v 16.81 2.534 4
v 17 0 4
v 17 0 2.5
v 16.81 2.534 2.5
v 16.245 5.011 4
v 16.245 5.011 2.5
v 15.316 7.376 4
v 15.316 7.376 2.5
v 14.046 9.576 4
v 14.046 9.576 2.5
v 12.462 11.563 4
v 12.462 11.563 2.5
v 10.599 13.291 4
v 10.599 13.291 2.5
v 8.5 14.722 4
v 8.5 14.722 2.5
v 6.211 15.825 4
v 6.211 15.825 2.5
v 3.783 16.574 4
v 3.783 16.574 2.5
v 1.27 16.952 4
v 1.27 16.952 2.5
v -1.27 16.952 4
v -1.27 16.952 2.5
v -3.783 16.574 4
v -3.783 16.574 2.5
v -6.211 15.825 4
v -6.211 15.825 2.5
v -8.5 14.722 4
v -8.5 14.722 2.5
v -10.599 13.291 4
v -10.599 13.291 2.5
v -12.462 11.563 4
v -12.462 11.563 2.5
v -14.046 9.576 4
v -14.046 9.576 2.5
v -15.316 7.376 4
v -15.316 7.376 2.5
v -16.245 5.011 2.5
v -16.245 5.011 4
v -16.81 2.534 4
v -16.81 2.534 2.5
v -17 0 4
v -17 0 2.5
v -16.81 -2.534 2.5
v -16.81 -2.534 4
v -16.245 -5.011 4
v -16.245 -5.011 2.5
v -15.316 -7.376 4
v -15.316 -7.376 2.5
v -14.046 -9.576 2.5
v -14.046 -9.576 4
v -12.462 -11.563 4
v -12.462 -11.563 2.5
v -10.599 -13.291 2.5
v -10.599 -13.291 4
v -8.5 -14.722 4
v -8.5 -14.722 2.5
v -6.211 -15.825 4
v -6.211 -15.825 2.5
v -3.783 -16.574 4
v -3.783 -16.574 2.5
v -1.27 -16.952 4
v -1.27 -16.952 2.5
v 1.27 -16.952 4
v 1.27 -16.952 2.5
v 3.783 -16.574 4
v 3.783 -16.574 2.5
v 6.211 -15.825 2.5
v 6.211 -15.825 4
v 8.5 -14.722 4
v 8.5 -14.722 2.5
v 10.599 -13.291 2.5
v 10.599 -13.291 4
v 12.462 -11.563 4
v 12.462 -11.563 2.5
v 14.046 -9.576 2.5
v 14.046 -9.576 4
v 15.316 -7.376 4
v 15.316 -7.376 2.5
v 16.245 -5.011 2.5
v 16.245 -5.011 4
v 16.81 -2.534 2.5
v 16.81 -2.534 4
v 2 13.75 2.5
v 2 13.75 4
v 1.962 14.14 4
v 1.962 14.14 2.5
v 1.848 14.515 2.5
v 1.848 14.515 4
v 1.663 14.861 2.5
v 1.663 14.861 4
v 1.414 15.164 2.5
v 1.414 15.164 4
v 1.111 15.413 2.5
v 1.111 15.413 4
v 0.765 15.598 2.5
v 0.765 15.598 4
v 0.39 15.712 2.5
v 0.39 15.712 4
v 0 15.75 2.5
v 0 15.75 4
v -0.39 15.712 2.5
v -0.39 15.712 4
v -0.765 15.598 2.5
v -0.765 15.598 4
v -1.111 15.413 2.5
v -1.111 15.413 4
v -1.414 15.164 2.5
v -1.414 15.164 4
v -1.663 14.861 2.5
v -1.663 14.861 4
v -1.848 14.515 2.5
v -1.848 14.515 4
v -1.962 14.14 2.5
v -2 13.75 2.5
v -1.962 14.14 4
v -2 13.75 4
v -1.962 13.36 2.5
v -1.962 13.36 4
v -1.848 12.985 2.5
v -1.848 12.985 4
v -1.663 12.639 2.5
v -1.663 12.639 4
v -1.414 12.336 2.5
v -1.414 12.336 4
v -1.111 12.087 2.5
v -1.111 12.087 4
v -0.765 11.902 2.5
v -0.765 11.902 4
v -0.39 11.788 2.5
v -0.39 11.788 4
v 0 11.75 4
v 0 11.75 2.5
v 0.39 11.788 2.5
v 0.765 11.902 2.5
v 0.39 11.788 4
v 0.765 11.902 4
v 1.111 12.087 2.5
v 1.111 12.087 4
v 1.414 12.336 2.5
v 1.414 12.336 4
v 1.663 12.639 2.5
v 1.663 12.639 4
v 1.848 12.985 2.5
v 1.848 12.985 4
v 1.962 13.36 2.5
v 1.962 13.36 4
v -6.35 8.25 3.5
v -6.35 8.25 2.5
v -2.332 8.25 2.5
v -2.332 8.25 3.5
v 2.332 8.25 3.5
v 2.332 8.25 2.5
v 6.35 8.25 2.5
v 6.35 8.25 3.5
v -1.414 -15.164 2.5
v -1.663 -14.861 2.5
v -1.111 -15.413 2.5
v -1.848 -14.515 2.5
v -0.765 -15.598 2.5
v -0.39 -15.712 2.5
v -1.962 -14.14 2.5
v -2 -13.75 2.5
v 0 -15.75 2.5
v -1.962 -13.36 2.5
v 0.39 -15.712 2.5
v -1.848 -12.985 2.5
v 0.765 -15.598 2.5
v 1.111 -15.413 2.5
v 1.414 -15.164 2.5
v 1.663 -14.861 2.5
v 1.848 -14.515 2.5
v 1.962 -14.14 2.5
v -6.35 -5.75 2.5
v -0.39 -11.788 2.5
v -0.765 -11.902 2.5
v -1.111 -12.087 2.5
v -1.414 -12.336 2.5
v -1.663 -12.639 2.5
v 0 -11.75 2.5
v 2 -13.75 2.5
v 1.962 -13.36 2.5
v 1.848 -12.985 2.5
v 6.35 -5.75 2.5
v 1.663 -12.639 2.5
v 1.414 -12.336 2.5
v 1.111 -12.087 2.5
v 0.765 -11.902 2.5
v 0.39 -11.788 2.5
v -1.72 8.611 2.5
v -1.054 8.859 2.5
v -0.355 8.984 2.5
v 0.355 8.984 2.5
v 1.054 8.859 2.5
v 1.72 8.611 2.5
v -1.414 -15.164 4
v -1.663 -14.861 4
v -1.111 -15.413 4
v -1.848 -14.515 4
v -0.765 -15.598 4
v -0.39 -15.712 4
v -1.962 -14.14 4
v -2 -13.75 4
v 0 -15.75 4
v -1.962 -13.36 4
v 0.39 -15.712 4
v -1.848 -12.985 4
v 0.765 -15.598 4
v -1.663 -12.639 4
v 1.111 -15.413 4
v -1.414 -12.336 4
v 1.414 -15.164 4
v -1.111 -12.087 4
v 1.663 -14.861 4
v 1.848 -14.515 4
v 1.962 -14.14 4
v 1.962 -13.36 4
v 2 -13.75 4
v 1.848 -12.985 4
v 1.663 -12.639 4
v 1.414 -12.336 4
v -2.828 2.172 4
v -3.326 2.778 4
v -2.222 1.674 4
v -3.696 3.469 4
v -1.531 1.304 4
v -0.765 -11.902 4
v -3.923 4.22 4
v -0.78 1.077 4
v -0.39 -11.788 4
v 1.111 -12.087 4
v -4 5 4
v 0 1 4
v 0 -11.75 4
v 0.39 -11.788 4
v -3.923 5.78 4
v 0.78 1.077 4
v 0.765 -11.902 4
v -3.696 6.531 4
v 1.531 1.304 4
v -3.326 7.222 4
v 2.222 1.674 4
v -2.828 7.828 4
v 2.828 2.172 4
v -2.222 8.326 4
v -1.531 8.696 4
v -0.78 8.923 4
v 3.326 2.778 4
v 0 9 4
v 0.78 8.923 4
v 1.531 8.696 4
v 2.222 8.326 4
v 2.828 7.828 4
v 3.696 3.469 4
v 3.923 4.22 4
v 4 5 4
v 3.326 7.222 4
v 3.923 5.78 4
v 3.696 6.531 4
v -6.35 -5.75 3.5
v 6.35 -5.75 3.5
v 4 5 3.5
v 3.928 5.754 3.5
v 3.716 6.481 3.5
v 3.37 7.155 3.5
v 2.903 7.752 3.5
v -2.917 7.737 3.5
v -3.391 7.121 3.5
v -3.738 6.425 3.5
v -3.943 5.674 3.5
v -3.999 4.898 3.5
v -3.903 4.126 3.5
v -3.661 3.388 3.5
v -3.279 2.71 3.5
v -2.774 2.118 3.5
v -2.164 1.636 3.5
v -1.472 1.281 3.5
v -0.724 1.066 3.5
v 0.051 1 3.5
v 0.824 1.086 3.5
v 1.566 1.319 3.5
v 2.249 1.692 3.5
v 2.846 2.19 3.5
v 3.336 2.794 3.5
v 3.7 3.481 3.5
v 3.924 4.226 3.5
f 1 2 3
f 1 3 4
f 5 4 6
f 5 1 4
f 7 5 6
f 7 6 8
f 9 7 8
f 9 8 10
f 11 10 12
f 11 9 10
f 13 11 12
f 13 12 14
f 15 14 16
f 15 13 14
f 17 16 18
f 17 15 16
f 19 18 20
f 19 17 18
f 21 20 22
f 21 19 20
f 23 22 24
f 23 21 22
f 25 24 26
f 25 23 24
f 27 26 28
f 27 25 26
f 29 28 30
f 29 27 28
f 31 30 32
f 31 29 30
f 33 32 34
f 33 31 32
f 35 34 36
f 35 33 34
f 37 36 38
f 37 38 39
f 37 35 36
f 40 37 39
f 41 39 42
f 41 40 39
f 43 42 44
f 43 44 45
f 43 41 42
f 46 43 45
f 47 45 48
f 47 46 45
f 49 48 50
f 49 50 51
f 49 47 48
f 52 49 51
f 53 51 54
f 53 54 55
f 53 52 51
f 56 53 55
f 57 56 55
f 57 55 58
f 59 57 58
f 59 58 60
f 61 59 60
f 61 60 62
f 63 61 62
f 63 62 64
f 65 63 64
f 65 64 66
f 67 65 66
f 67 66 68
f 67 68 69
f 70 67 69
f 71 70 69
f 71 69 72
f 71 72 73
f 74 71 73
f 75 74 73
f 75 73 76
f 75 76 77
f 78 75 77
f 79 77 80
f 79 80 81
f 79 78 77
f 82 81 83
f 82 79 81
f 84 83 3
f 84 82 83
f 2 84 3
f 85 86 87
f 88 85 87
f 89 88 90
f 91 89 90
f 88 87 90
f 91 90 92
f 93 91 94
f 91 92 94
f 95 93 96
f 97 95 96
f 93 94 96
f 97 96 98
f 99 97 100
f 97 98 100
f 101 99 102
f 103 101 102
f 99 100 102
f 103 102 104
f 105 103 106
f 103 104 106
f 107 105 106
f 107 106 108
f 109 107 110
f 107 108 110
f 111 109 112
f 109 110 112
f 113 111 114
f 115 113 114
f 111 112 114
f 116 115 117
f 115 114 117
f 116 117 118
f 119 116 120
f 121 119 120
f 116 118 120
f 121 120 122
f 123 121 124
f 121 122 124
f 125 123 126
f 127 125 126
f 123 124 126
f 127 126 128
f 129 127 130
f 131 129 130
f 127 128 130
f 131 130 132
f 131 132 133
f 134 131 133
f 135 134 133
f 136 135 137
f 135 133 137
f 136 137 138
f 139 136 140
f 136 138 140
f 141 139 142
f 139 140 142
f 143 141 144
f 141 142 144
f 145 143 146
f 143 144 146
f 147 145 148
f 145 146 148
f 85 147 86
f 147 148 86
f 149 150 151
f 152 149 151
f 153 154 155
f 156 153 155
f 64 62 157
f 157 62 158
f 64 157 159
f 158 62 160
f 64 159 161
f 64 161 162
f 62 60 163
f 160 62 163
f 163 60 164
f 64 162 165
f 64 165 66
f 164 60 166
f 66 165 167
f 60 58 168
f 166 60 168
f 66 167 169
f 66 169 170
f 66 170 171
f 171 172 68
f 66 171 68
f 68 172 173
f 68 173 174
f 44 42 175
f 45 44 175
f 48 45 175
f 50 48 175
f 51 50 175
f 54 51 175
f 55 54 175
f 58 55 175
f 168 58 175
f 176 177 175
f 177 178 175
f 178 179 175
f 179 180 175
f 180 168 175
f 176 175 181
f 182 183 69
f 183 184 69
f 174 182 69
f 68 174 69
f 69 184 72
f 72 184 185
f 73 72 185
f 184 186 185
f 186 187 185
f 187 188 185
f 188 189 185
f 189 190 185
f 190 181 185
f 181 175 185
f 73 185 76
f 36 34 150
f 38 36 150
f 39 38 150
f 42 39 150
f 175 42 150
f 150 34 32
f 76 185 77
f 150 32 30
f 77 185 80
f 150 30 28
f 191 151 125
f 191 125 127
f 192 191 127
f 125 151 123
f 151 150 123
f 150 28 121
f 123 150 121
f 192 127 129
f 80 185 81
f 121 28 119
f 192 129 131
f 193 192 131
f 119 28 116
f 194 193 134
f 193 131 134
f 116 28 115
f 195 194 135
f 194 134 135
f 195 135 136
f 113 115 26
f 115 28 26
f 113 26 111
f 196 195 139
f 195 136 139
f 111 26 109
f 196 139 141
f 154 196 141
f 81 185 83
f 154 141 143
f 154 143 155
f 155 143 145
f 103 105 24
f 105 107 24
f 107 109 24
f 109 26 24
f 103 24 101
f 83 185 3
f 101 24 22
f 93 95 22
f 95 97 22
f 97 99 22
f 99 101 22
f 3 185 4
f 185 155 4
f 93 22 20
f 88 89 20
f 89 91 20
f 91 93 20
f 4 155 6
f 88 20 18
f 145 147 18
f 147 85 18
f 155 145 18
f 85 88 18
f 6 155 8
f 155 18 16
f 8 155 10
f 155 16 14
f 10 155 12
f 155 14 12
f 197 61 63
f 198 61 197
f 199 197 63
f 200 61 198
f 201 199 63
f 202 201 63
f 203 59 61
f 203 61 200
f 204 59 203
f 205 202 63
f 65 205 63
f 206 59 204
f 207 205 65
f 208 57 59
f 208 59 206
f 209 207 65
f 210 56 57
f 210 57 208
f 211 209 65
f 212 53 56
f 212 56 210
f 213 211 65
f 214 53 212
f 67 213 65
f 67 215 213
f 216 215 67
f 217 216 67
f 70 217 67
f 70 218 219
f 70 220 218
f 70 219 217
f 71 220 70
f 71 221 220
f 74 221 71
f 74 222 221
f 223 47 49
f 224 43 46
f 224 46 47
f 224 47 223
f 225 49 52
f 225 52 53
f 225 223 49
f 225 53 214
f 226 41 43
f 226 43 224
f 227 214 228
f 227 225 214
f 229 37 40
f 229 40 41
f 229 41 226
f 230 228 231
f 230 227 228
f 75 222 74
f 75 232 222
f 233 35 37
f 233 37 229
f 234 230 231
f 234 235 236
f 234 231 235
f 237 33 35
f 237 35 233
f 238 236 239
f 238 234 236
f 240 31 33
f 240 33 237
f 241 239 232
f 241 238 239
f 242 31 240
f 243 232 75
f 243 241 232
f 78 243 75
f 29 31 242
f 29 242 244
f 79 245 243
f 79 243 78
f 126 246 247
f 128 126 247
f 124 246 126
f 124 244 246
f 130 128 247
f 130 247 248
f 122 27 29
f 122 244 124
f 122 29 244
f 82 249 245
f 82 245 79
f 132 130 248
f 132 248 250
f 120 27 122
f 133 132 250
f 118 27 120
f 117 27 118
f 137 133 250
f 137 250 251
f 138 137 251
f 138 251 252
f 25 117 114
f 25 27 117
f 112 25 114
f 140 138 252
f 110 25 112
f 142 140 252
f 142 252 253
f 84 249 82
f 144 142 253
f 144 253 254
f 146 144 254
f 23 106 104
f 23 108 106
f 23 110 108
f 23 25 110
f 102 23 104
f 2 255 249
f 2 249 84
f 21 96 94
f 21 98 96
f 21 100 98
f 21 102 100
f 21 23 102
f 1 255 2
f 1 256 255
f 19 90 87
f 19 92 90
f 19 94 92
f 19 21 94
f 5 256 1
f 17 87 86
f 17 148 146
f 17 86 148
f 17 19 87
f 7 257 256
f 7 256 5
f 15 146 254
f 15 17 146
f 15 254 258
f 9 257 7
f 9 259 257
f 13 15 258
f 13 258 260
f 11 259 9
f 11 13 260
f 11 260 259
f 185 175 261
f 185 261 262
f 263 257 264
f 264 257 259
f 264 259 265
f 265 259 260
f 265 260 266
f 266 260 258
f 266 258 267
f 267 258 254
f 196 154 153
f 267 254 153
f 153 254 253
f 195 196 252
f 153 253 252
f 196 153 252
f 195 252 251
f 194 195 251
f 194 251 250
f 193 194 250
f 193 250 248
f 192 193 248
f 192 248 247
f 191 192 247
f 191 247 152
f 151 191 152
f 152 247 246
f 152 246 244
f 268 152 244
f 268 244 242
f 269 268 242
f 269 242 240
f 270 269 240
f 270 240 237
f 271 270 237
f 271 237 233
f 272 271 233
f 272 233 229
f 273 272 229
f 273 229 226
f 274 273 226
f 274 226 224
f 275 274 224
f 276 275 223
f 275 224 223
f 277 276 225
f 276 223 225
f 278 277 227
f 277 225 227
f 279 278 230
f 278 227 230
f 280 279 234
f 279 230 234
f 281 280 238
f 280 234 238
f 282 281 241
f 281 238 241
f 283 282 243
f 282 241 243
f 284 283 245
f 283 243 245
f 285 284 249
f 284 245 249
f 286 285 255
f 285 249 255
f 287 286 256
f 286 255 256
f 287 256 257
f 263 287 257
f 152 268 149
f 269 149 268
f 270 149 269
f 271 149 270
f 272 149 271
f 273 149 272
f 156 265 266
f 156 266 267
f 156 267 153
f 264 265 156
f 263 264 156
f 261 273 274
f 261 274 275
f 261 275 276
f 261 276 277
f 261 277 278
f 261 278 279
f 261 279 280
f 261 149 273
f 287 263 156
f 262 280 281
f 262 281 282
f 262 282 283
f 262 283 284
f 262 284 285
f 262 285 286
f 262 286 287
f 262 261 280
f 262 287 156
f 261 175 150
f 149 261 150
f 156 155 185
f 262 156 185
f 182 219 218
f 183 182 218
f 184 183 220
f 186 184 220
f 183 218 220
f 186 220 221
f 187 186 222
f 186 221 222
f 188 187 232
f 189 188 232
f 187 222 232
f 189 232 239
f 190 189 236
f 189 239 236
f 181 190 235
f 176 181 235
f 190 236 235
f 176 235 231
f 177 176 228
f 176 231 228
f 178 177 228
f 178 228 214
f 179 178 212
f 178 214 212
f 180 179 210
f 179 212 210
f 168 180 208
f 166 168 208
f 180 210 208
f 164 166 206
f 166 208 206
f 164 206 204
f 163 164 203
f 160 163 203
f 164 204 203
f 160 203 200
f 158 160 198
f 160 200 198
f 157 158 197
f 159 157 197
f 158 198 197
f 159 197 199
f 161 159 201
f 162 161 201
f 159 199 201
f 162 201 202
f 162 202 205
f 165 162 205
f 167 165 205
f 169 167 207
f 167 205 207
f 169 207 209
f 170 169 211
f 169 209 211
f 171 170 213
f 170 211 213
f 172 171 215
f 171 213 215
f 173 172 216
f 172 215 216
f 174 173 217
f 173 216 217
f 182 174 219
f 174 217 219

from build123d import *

# Parameters (mm, degrees)
F0_R     = 9.1
F0_W     = 12.7
F0_H     = 11.5
F1_DEPTH = 14
F3_DEPTH = 5
F5_R     = 17
F5_R_2   = 2
F5_R_3   = 4
F6_DEPTH = 1.5
F2_W     = 12.7
F2_H     = 9
F2_H_2   = 2.5
F8_DEPTH = 3.5


with BuildPart() as f1:
    # F0 (on Top) → F1 (new body)
    with BuildSketch(Plane.XY):
        Circle(F0_R)
        Rectangle(F0_W, F0_H, mode=Mode.SUBTRACT)
    extrude(amount=F1_DEPTH)

    # F2 (on face) → F3 (cut)
    with BuildSketch(Plane(origin=(0, 0, 0), x_dir=(1, 0, 0), z_dir=(0, 0, -1))):
        with BuildLine():
            Line((6.35, -6.5182436285), (6.35, -5.75))
            Line((6.35, -5.75), (-6.35, -5.75))
            Line((-6.35, -5.75), (-6.35, -6.5182436285))
            ThreePointArc((-6.35, -6.5182436285), (-5.1681747735, -7.4899912891), (-3.8402473879, -8.25))
            Line((-3.8402473879, -8.25), (3.8402473879, -8.25))
            ThreePointArc((3.8402473879, -8.25), (5.1681747735, -7.4899912891), (6.35, -6.5182436285))
        make_face()
    extrude(amount=-F3_DEPTH, mode=Mode.SUBTRACT)


with BuildPart() as f6:
    # F5 (on offset) → F6 (new body)
    with BuildSketch(Plane.XY.offset(4)):
        Circle(F5_R)
        with Locations((0, -13.75)):
            Circle(F5_R_2, mode=Mode.SUBTRACT)
        with Locations((0, 5)):
            Circle(F5_R_3, mode=Mode.SUBTRACT)
        with Locations((0, 13.75)):
            Circle(F5_R_2, mode=Mode.SUBTRACT)
    extrude(amount=-F6_DEPTH)

    # F2 (on face) → F8 (cut)
    with BuildSketch(Plane(origin=(0, 0, 0), x_dir=(1, 0, 0), z_dir=(0, 0, -1))):
        with Locations((0, 1.25)):
            Rectangle(F2_W, F2_H)
        with Locations((0, -4.5)):
            Rectangle(F2_W, F2_H_2)
        with BuildLine():
            ThreePointArc((-3.8402473879, -8.25), (-5.1681747735, -7.4899912891), (-6.35, -6.5182436285))
            Line((-6.35, -6.5182436285), (-6.35, -8.25))
            Line((-6.35, -8.25), (-3.8402473879, -8.25))
        make_face()
        with BuildLine():
            Line((6.35, -6.5182436285), (6.35, -5.75))
            Line((6.35, -5.75), (-6.35, -5.75))
            Line((-6.35, -5.75), (-6.35, -6.5182436285))
            ThreePointArc((-6.35, -6.5182436285), (-5.1681747735, -7.4899912891), (-3.8402473879, -8.25))
            Line((-3.8402473879, -8.25), (3.8402473879, -8.25))
            ThreePointArc((3.8402473879, -8.25), (5.1681747735, -7.4899912891), (6.35, -6.5182436285))
        make_face()
        with BuildLine():
            Line((6.35, -8.25), (6.35, -6.5182436285))
            ThreePointArc((6.35, -6.5182436285), (5.1681747735, -7.4899912891), (3.8402473879, -8.25))
            Line((3.8402473879, -8.25), (6.35, -8.25))
        make_face()
    extrude(amount=-F8_DEPTH, mode=Mode.SUBTRACT)


solid = f6.part
